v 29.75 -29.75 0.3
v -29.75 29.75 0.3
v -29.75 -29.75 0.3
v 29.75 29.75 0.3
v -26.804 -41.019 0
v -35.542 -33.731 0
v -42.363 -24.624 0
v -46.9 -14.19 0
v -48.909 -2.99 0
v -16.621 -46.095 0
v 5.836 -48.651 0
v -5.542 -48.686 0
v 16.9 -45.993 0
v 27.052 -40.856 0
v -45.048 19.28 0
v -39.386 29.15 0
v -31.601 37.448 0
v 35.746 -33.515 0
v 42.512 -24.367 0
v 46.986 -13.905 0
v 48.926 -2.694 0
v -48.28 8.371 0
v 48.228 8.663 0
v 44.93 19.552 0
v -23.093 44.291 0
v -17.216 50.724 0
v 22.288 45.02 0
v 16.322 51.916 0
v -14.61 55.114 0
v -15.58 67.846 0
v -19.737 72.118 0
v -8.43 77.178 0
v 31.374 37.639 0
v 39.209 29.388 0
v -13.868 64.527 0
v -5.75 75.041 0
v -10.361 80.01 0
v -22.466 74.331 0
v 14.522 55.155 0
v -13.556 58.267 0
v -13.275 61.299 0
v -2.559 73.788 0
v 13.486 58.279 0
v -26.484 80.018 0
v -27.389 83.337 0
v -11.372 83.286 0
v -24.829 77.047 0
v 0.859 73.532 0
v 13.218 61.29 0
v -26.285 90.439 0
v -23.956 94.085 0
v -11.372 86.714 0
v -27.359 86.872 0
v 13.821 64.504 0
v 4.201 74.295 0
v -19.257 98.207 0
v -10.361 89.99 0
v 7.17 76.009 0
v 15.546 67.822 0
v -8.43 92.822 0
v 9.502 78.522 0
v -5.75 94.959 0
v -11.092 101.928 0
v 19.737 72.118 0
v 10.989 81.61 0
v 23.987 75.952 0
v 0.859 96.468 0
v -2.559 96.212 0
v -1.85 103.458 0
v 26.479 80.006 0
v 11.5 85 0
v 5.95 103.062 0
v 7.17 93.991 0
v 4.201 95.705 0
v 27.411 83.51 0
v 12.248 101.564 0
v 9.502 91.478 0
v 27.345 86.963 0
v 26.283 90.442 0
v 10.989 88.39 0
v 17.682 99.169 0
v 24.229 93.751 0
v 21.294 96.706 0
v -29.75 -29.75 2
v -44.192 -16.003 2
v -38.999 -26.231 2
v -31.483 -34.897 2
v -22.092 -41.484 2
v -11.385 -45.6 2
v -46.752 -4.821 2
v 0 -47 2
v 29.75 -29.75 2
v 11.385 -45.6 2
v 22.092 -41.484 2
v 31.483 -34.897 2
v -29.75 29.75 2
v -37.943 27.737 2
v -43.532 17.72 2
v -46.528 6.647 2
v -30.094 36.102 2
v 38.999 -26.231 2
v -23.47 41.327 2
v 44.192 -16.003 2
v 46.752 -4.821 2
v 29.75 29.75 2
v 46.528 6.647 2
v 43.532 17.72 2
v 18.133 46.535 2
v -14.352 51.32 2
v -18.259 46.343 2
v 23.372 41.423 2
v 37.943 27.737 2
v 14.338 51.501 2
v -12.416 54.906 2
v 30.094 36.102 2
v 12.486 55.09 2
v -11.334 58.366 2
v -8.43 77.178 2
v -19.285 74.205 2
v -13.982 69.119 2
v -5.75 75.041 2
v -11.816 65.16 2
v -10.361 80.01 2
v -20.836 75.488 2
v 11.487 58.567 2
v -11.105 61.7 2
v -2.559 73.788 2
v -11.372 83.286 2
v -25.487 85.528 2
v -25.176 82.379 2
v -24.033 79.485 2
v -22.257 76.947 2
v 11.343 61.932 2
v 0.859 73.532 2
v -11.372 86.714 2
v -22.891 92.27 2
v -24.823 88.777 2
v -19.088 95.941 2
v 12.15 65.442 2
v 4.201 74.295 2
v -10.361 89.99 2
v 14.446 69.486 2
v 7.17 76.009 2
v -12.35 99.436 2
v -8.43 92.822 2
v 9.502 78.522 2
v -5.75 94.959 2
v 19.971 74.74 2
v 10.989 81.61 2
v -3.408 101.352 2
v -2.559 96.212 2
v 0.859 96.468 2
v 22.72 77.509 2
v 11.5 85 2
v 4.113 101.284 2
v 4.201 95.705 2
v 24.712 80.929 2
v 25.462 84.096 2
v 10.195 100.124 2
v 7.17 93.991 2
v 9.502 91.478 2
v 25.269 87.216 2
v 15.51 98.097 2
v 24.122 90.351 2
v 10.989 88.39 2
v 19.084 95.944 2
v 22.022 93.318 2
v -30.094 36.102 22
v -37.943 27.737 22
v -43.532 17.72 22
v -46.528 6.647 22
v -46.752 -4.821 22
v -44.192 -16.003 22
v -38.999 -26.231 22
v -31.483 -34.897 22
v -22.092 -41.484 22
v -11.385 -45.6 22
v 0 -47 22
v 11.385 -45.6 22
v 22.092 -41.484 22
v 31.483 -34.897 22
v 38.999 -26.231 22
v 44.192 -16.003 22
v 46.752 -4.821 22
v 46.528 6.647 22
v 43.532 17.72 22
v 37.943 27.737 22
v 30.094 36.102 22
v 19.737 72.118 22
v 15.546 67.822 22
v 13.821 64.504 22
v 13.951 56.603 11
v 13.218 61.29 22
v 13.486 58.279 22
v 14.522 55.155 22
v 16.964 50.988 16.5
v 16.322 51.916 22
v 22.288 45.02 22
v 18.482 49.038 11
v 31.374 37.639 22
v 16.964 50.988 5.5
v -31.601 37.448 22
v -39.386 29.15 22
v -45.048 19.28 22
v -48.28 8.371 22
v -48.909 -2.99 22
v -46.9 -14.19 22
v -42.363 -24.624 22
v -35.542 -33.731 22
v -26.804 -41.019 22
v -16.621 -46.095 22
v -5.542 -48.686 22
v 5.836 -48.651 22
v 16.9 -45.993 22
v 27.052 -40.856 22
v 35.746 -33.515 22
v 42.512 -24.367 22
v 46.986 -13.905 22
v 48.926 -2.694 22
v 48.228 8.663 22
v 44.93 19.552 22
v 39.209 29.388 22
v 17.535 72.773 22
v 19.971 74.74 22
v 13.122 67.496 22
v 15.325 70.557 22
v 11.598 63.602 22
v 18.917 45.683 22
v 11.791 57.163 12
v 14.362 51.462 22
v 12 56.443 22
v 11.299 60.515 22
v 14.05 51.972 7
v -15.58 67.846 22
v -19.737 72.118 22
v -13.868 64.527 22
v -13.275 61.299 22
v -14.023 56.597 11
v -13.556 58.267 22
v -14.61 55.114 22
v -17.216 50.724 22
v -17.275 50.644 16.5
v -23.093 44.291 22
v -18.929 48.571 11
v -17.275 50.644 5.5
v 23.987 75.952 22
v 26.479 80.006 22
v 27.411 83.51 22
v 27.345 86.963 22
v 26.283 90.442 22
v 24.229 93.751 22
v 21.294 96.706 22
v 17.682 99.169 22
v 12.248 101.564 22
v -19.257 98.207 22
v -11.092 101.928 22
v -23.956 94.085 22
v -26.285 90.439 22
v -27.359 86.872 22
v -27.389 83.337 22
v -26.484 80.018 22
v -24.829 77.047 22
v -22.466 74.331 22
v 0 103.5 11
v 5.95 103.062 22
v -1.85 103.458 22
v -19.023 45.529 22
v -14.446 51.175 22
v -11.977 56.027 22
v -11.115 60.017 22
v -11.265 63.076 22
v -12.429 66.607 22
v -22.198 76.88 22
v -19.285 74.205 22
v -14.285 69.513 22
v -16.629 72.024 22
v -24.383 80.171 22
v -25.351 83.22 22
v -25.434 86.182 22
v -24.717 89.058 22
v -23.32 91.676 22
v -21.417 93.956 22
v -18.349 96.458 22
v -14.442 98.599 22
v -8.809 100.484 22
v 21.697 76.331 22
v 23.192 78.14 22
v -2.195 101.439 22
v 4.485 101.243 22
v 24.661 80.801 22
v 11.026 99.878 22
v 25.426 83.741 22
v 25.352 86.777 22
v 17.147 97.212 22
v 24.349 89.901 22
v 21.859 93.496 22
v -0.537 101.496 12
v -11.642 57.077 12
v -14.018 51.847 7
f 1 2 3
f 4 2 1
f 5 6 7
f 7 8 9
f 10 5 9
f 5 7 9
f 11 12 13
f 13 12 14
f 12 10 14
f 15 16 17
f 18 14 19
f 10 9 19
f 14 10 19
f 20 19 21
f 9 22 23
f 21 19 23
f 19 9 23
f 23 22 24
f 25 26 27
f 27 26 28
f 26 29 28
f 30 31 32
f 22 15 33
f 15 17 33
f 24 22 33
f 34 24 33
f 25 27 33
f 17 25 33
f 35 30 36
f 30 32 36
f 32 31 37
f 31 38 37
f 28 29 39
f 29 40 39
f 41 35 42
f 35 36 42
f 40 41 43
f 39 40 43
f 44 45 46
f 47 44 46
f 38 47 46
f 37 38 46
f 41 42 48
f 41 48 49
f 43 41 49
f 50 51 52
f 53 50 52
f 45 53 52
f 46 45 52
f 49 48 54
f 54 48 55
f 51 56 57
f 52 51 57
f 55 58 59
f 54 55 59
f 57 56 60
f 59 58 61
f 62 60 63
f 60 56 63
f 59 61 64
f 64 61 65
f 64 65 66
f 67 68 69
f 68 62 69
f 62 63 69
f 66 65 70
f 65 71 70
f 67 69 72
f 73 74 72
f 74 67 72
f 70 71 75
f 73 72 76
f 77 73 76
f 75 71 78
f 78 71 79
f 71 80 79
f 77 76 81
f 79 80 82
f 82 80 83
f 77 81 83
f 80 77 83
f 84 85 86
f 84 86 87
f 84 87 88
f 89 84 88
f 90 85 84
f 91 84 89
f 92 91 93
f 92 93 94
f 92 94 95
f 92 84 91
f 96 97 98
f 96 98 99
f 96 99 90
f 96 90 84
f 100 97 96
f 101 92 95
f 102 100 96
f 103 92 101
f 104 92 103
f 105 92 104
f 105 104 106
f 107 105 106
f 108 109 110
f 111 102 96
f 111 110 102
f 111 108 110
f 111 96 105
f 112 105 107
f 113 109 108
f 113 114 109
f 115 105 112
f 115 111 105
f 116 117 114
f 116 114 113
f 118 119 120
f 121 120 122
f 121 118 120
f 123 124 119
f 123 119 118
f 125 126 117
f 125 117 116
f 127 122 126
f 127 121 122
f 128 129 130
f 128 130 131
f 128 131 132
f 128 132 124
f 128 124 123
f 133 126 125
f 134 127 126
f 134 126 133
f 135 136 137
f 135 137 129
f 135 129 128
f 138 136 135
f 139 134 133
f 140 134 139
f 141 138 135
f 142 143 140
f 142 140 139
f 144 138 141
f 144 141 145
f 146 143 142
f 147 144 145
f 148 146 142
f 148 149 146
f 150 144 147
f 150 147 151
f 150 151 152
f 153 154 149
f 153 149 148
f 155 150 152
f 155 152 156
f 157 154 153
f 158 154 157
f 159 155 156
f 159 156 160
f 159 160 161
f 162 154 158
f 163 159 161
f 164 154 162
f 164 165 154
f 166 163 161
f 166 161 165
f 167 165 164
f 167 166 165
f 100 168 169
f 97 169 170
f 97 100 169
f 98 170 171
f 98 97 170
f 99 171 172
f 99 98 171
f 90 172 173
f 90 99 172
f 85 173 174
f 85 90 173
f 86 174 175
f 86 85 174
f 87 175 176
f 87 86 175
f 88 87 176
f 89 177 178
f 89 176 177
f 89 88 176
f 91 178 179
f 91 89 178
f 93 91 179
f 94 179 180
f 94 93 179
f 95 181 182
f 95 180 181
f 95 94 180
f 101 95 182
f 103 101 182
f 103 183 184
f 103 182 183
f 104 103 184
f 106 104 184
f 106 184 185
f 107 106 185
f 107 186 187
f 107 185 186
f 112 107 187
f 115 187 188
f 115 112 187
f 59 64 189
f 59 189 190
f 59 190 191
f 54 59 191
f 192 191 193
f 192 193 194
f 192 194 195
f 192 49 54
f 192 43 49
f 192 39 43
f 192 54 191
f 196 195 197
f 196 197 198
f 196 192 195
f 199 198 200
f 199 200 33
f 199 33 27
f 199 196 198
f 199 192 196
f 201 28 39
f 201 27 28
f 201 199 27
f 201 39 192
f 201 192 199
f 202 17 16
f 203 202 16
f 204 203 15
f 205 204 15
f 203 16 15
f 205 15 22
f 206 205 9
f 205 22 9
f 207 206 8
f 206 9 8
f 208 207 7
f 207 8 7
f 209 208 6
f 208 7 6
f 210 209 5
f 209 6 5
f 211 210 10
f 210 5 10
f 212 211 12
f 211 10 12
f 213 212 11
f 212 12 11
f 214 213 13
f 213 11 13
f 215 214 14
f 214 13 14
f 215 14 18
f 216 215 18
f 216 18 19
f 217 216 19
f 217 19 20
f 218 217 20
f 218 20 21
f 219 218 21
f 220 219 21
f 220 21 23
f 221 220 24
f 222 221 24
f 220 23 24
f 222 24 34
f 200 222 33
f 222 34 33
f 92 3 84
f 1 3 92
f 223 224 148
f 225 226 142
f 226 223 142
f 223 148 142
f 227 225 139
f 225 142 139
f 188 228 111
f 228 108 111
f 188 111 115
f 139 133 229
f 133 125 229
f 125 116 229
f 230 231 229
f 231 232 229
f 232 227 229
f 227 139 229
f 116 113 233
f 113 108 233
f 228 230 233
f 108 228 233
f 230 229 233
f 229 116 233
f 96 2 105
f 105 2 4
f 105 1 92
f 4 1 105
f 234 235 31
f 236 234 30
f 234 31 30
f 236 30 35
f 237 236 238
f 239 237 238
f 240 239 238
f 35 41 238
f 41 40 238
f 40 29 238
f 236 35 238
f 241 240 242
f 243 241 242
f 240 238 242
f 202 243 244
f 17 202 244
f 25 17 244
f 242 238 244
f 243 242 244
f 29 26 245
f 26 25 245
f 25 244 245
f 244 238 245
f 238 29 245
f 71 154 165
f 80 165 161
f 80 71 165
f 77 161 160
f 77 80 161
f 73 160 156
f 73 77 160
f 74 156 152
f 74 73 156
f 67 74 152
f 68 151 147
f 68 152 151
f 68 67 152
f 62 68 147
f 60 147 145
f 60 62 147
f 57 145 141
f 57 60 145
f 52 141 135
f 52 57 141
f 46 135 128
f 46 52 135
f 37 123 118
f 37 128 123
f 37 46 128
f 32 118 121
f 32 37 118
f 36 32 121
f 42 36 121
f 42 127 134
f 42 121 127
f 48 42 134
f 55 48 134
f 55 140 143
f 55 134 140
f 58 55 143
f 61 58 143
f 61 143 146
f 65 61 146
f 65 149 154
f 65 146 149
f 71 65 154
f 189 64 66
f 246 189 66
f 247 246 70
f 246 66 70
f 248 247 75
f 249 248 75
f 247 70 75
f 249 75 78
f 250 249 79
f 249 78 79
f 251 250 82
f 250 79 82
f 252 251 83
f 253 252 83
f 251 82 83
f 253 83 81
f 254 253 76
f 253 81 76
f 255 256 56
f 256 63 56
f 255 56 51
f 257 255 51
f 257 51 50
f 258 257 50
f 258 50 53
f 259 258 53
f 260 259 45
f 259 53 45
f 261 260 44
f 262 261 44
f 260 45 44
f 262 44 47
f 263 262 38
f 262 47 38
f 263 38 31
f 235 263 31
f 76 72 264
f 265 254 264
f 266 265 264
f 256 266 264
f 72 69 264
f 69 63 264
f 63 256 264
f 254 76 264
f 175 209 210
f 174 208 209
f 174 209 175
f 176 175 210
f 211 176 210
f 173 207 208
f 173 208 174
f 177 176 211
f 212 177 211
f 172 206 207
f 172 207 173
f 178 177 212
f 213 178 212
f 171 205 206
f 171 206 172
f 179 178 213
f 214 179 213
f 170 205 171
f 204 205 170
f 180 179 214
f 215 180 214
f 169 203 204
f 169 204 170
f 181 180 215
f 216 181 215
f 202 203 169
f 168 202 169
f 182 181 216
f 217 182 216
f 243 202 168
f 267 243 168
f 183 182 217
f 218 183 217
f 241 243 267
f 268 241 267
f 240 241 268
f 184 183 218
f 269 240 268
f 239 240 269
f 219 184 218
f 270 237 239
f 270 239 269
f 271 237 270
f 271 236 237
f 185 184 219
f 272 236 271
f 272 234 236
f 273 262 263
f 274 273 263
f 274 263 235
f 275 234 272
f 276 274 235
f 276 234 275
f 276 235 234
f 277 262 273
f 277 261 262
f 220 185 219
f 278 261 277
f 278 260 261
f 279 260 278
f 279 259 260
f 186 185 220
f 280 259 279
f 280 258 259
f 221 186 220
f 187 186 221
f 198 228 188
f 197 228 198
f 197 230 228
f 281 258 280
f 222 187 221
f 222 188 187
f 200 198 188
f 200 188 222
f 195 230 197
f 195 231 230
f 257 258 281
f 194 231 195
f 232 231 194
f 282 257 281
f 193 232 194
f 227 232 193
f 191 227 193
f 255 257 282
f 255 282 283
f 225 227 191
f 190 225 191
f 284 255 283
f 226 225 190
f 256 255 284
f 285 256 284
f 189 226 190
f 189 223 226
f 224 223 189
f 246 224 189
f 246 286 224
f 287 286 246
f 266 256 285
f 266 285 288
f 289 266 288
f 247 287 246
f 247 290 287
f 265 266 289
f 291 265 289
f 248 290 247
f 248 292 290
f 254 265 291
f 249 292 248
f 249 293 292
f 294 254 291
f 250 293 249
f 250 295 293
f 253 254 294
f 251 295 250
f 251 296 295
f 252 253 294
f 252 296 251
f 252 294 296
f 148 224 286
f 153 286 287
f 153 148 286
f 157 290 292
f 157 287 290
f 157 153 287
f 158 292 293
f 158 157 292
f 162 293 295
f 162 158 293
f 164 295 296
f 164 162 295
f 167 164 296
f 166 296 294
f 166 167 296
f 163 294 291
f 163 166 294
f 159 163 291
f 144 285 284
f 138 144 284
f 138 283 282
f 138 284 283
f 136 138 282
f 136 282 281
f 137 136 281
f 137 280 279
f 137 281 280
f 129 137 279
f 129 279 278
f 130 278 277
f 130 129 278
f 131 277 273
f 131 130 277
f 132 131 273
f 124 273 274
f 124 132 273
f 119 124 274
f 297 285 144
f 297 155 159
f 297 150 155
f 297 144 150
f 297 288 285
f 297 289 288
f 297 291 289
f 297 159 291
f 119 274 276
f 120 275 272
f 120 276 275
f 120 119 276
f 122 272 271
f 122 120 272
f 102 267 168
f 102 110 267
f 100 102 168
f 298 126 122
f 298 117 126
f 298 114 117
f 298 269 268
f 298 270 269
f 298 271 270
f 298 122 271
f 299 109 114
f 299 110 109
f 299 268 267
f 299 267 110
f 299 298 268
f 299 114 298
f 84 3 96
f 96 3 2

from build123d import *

# Parameters (mm, degrees)
SKETCH006_R     = 11.5
PAD002_DEPTH    = 22
SKETCH007_W     = 59.5
SKETCH007_H     = 59.5
POCKET001_DEPTH = 21.701
POCKET002_DEPTH = 20.001


with BuildPart() as part:
    # Sketch006 → Pad002 (new body)
    with BuildSketch(Plane.XY):
        with BuildLine():
            ThreePointArc((-31.601416, 37.447971), (0.14834, -48.999775), (31.374102, 37.63862))
            add(Edge.make_bspline(
                [(19.736906, 72.117588), (2.37782, 58.411312), (31.374102, 37.63862)],
                knots=[0, 0, 0, 1, 1, 1], degree=2, weights=[0.989264, 1, 1]))
            add(Edge.make_bspline(
                [(19.736906, 72.117588), (64.998138, 103.5), (0, 103.5), (-64.998138, 103.5), (-19.736906, 72.117588)],
                knots=[5.512891, 5.512891, 5.512891, 7.853982, 7.853982, 10.195072, 10.195072, 10.195072], degree=2, weights=[1, 0.389649, 1, 0.389649, 1]))
            add(Edge.make_bspline(
                [(-19.736906, 72.117588), (-2.37782, 58.411312), (-31.601416, 37.447971)],
                knots=[0, 0, 0, 1, 1, 1], degree=2))
        make_face()
        with Locations((0, 85)):
            Circle(SKETCH006_R, mode=Mode.SUBTRACT)
    extrude(amount=PAD002_DEPTH)

    # Sketch007 → Pocket001 (cut, through all)
    with BuildSketch(Plane.XY.offset(0.3)):
        Rectangle(SKETCH007_W, SKETCH007_H)
    extrude(amount=POCKET001_DEPTH, mode=Mode.SUBTRACT)

    # Sketch008 → Pocket002 (cut, through all)
    with BuildSketch(Plane.XY.offset(2)):
        with BuildLine():
            add(Edge.make_bspline(
                [(19.970939, 74.740258), (53.708474, 102.235842), (-0.537125, 101.496339), (-54.782724, 100.756837), (-19.285395, 74.205097)],
                knots=[5.612143, 5.612143, 5.612143, 7.875047, 7.875047, 10.137951, 10.137951, 10.137951], degree=2, weights=[1, 0.425346, 1, 0.425346, 1]))
            add(Edge.make_bspline(
                [(-19.285395, 74.205097), (1.40607, 59), (-30.093518, 36.102357)],
                knots=[0, 0, 0, 1, 1, 1], degree=2))
            ThreePointArc((-30.093518, 36.102357), (0, -47), (30.093518, 36.102357))
            add(Edge.make_bspline(
                [(19.970939, 74.740258), (-1.40607, 59), (30.093518, 36.102357)],
                knots=[0, 0, 0, 1, 1, 1], degree=2, weights=[0.989264, 1, 1]))
        make_face()
    extrude(amount=POCKET002_DEPTH, mode=Mode.SUBTRACT)


solid = part.part
